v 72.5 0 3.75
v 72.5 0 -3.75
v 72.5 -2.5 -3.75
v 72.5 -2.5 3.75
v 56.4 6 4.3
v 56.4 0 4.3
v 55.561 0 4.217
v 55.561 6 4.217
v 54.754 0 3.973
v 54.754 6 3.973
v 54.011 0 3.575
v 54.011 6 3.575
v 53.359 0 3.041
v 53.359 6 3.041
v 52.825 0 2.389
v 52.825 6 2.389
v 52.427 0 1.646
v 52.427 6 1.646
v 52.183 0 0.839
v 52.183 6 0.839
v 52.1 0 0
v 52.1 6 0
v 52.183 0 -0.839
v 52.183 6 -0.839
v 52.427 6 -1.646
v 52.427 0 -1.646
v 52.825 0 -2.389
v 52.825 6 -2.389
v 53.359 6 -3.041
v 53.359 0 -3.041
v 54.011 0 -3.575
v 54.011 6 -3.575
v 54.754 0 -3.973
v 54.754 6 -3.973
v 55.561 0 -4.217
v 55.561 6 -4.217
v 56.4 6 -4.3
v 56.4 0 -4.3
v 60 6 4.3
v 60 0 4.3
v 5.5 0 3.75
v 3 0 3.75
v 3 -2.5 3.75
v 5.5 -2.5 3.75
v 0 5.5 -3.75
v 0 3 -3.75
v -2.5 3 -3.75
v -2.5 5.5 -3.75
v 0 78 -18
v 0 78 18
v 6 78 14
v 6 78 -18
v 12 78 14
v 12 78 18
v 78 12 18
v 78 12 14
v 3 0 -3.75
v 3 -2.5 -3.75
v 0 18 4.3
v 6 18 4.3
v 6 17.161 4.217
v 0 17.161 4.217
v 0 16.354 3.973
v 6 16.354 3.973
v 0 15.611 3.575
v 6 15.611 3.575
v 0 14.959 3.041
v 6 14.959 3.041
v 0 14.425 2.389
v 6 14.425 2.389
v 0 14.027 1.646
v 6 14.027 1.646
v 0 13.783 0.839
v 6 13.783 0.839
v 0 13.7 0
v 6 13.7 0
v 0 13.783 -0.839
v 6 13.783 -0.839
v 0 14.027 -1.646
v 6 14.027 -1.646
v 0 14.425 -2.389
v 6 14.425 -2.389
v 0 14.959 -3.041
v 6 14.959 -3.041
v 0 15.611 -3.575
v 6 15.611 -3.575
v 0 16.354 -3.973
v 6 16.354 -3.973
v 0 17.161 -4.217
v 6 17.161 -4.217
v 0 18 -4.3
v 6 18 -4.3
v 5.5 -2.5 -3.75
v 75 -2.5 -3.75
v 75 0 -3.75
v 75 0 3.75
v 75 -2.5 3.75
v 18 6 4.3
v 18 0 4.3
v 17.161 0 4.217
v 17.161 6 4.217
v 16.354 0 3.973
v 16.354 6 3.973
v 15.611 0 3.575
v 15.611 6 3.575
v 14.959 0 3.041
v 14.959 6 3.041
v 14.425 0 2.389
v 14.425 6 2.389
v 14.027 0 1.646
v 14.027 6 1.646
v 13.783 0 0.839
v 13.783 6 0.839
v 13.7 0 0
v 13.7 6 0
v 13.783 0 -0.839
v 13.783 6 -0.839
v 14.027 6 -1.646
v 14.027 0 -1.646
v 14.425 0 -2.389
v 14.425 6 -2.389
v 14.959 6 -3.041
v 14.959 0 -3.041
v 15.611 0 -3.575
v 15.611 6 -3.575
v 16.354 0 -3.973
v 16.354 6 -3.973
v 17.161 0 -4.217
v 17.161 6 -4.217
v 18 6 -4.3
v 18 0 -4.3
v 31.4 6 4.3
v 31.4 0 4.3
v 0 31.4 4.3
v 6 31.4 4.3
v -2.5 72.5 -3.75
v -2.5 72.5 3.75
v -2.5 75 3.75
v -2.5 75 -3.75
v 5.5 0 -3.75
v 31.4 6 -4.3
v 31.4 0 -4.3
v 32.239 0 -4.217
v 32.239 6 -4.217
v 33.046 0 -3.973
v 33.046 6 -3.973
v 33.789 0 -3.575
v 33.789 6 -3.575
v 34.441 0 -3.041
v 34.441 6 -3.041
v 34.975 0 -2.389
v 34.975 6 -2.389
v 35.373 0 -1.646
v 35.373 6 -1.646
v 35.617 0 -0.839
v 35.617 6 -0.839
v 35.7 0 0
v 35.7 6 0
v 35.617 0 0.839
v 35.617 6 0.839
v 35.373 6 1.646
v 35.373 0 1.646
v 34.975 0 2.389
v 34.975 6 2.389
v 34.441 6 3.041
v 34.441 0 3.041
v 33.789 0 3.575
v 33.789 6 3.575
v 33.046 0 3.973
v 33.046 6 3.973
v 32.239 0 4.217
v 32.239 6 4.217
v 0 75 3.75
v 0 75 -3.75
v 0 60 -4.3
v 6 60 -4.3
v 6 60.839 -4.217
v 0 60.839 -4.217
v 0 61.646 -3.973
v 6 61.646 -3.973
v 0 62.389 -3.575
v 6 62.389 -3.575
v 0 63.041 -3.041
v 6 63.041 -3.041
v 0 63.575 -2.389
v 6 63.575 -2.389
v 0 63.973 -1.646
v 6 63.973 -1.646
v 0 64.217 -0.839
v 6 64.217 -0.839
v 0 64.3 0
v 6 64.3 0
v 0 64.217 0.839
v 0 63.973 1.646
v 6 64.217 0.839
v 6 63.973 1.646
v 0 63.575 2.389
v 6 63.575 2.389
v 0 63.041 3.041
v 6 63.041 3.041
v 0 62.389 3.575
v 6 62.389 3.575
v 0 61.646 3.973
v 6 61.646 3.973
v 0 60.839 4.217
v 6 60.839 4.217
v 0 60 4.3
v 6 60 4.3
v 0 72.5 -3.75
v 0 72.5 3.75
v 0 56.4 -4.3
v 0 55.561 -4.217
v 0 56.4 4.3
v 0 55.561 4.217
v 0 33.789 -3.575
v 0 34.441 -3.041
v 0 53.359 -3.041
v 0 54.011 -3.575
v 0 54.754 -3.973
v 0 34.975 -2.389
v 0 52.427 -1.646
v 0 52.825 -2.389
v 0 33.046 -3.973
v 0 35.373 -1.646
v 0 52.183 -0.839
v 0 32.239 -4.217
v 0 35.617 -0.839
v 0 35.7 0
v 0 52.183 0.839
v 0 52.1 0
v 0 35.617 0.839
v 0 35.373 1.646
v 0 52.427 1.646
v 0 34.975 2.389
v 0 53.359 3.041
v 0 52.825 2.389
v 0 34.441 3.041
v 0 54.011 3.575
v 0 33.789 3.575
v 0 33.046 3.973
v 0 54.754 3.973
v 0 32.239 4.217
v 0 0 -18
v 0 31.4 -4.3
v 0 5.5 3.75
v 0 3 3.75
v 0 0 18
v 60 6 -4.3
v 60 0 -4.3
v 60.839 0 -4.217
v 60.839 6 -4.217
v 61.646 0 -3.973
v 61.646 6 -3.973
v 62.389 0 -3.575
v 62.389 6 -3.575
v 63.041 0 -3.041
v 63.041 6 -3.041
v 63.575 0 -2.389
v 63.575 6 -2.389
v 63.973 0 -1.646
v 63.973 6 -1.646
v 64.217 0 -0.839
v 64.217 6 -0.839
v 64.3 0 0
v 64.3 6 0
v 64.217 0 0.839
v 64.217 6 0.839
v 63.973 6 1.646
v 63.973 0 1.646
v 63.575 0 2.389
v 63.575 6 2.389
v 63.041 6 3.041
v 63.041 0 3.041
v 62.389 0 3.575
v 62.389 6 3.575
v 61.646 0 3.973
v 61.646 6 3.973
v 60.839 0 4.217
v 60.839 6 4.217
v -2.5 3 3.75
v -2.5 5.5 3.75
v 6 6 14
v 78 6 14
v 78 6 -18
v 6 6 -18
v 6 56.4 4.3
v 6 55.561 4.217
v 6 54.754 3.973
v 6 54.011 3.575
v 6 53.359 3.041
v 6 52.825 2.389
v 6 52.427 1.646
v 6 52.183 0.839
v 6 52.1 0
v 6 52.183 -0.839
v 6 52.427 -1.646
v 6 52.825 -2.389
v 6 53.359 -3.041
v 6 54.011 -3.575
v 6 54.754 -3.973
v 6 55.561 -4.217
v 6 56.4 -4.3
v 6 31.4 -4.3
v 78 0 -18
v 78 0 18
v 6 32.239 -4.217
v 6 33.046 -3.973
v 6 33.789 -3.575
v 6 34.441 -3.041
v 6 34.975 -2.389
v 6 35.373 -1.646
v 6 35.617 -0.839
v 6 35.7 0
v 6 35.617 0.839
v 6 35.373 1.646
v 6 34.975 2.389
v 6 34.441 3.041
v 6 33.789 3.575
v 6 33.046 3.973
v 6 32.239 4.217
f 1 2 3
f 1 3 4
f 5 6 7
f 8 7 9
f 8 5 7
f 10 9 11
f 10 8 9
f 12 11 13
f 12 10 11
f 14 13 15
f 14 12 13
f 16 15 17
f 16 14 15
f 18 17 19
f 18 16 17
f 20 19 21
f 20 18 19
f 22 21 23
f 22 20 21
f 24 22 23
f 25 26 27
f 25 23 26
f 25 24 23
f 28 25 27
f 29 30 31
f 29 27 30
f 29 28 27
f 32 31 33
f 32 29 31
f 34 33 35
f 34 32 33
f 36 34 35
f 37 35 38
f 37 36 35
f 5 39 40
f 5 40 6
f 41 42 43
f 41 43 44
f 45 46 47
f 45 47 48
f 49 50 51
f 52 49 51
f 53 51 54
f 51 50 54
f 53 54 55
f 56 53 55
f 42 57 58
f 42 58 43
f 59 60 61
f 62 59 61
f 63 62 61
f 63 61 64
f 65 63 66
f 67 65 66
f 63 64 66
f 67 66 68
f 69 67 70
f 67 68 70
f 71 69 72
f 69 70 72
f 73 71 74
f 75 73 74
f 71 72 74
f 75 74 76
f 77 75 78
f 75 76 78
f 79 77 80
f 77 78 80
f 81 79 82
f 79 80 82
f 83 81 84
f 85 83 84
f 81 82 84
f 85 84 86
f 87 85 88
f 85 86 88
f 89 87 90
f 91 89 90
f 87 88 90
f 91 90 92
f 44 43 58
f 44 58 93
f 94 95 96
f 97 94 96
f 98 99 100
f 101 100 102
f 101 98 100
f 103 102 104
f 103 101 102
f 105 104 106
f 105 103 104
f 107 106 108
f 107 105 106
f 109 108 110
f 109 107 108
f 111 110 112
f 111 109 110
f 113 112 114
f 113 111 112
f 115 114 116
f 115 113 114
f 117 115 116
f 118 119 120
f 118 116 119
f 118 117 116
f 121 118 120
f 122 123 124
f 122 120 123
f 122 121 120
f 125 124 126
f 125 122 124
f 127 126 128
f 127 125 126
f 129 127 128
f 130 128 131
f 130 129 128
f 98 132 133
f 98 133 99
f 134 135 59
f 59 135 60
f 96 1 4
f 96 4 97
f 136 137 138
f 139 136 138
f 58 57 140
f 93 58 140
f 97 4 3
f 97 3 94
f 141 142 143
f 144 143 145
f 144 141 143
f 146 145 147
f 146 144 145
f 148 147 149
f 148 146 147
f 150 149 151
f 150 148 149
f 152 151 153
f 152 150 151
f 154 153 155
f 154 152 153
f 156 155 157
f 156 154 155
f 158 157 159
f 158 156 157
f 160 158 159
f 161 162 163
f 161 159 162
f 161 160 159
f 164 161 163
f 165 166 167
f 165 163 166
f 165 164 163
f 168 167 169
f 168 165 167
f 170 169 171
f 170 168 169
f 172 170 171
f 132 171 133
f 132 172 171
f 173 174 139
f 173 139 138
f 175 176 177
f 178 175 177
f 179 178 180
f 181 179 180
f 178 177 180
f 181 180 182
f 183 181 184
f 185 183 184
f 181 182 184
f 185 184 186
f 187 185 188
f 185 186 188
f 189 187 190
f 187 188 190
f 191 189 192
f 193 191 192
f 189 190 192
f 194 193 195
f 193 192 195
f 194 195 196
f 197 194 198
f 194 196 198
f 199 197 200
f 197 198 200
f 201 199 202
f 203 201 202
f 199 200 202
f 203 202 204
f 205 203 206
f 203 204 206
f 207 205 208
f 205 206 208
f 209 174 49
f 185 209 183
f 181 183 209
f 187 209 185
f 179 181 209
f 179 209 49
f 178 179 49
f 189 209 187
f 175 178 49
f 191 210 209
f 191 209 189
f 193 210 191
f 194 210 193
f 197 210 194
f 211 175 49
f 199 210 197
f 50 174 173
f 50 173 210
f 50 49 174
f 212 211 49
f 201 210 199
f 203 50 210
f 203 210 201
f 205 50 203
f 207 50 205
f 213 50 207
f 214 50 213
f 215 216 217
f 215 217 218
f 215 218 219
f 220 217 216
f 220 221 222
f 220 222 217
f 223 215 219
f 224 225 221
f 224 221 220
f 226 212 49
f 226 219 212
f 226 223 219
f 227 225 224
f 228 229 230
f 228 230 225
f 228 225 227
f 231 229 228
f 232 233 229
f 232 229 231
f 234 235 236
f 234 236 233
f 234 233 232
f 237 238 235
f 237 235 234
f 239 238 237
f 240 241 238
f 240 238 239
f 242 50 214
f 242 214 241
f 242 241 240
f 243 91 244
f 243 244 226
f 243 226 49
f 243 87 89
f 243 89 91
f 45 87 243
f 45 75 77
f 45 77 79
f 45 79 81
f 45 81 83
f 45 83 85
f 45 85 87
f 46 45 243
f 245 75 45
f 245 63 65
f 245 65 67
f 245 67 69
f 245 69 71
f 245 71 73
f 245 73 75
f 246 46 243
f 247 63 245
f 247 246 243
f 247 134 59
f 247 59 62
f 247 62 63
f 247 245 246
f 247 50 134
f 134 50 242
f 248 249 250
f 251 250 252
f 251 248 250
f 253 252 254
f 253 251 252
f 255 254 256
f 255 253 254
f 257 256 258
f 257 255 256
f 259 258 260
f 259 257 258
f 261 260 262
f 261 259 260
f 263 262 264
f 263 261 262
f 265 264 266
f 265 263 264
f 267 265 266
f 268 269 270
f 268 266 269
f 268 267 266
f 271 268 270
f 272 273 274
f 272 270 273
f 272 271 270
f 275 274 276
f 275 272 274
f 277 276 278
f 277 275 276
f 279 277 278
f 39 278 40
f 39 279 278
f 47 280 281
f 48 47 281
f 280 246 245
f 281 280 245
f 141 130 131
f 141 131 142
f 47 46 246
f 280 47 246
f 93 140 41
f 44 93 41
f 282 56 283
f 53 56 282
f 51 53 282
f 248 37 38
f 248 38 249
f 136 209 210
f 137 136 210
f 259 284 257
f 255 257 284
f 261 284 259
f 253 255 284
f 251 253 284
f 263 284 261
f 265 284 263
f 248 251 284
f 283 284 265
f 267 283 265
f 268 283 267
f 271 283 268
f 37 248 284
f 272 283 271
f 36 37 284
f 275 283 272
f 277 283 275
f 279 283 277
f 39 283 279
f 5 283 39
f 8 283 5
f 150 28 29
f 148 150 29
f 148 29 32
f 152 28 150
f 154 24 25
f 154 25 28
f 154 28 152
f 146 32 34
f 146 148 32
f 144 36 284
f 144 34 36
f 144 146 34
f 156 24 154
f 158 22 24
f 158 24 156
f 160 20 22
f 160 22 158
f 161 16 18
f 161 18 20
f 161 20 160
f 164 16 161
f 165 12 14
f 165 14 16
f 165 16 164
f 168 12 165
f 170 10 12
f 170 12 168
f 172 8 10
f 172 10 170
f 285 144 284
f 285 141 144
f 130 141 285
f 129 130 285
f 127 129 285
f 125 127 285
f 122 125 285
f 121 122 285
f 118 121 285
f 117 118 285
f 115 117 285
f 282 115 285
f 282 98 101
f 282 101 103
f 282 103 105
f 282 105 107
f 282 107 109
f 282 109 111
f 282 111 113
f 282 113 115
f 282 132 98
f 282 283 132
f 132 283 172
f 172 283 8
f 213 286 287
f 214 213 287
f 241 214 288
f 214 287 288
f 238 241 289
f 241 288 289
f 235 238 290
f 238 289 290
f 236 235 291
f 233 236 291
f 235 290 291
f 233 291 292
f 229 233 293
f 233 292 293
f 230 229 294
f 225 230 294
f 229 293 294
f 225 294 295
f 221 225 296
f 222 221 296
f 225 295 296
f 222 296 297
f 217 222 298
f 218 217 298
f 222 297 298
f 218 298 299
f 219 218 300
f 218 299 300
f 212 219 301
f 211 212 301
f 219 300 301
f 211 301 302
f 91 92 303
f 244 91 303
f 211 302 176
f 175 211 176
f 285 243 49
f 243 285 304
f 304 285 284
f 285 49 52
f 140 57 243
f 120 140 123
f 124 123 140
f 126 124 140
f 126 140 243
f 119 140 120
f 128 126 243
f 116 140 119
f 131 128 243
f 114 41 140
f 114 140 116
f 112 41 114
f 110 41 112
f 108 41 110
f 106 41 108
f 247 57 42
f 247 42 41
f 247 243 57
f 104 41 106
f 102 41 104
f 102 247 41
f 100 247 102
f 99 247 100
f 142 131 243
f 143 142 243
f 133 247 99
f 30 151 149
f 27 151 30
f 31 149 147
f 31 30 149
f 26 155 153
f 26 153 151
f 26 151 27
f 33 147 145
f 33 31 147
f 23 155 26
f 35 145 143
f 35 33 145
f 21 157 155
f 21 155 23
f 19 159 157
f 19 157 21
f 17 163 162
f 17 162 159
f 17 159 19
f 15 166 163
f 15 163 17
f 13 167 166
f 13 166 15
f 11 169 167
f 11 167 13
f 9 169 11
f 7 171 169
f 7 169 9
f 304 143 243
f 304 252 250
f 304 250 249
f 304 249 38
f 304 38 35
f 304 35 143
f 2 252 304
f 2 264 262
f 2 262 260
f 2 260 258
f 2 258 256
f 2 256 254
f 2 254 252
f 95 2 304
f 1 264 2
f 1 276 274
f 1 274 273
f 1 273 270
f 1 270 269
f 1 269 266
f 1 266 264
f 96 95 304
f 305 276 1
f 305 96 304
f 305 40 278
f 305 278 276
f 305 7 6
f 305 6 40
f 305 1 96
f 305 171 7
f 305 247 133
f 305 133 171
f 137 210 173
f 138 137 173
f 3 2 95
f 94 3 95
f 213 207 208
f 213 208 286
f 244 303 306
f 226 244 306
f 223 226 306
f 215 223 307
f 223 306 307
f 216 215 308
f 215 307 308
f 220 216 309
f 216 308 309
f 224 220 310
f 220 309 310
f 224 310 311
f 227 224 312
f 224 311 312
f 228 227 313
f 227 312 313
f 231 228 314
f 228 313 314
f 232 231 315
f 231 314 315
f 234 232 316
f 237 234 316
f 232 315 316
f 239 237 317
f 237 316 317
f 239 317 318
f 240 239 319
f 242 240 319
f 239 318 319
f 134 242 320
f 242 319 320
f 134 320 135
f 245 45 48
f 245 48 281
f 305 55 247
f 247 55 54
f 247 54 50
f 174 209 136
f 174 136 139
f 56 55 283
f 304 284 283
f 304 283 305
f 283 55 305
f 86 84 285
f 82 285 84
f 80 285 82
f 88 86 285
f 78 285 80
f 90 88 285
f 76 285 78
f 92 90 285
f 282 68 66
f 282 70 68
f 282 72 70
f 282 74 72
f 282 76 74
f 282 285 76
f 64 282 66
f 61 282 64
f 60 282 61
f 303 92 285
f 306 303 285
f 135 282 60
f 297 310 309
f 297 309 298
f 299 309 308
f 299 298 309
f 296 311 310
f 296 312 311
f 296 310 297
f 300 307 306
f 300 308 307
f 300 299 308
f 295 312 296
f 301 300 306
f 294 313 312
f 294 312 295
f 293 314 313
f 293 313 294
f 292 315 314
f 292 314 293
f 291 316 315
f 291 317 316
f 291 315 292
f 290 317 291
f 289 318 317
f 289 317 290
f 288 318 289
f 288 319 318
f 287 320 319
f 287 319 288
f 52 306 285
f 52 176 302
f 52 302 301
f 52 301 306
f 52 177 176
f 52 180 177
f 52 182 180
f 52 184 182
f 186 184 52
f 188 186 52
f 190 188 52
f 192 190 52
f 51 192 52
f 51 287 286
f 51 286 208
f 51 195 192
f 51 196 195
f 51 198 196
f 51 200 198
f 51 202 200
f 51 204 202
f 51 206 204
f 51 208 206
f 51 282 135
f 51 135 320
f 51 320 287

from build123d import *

# Parameters (mm, degrees)
EXTRUDE_1_DEPTH     = 18
EXTRUDE_2_DEPTH     = 4
CUT_EXTRUDE_1_DEPTH = 7
SKETCH_4_W          = 2.5
SKETCH_4_H          = 7.5
EXTRUDE_3_DEPTH     = 2.5


with BuildPart() as part:
    # Эскиз1 → Бобышка-Вытянуть1 (new body, symmetric)
    with BuildSketch(Plane.XY):
        Polygon((0, 78), (0, 0), (78, 0), (78, 6), (6, 6), (6, 78), align=None)
    extrude(amount=EXTRUDE_1_DEPTH, both=True)

    # Эскиз2 → Бобышка-Вытянуть2 (add)
    with BuildSketch(Plane.XY.offset(18)):
        Polygon((78, 6), (6, 6), (6, 78), (12, 78), (78, 12), align=None)
    extrude(amount=-EXTRUDE_2_DEPTH)

    # Эскиз3 → Вырез-Вытянуть1 (cut, through all)
    with BuildSketch(Plane(origin=(0, 6, 0), x_dir=(1, 0, 0), z_dir=(0, 1, 0))):
        with BuildLine():
            Line((18, 4.3), (31.4, 4.3))
            ThreePointArc((31.4, 4.3), (35.7, 0), (31.4, -4.3))
            Line((31.4, -4.3), (18, -4.3))
            ThreePointArc((18, -4.3), (13.7, 0), (18, 4.3))
        make_face()
        with BuildLine():
            Line((56.4, 4.3), (60, 4.3))
            ThreePointArc((60, 4.3), (64.3, 0), (60, -4.3))
            Line((60, -4.3), (56.4, -4.3))
            ThreePointArc((56.4, -4.3), (52.1, 0), (56.4, 4.3))
        make_face()
    cut_extrude_1 = extrude(amount=-CUT_EXTRUDE_1_DEPTH, mode=Mode.SUBTRACT)

    # Эскиз4 → Бобышка-Вытянуть3 (add)
    with BuildSketch(Plane.XZ):
        with Locations((4.25, 0)):
            Rectangle(SKETCH_4_W, SKETCH_4_H)
        with Locations((73.75, 0)):
            Rectangle(SKETCH_4_W, SKETCH_4_H)
    extrude_3 = extrude(amount=EXTRUDE_3_DEPTH)

    # Зеркальное отражение3: Вырез-Вытянуть1, Бобышка-Вытянуть3 across plane
    add(cut_extrude_1.mirror(Plane(origin=(0, 0, 0), x_dir=(0, 0, 1), z_dir=(-0.707106781, 0.707106781, 0))), mode=Mode.SUBTRACT)
    add(extrude_3.mirror(Plane(origin=(0, 0, 0), x_dir=(0, 0, 1), z_dir=(-0.707106781, 0.707106781, 0))))


solid = part.part
